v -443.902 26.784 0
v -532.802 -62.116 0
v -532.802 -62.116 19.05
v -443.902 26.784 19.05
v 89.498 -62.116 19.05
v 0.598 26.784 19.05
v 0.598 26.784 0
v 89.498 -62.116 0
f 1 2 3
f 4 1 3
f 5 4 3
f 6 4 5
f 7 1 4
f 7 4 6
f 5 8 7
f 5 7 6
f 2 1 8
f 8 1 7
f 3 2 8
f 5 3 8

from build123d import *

# Parameters (mm, degrees)
F0_W     = 622.3
F0_H     = 88.9
F1_DEPTH = 19.05
F2_SIZE  = 88.89999
F3_SIZE  = 88.89999


# Not quite as in the source:
# - a fillet or chamfer is up to 0.001 mm smaller than in the source, because OpenCascade refuses the exact size


with BuildPart() as f1:
    # F0 (on Top) → F1 (new body)
    with BuildSketch(Plane.XY):
        with Locations((-221.6517408729, -17.6658927679)):
            Rectangle(F0_W, F0_H)
    extrude(amount=F1_DEPTH)

    # F2 (size 88.9 in the source; OpenCascade refuses exactly that, so slightly less here)
    f2_edges = [f1.edges().sort_by_distance(p)[0] for p in [
        (-532.801741, 26.784107, 9.525),
    ]]
    chamfer(f2_edges, length=F2_SIZE)

    # F3 (size 88.9 in the source; OpenCascade refuses exactly that, so slightly less here)
    f3_edges = [f1.edges().sort_by_distance(p)[0] for p in [
        (89.498259, 26.784107, 9.525),
    ]]
    chamfer(f3_edges, length=F3_SIZE)


solid = f1.part
